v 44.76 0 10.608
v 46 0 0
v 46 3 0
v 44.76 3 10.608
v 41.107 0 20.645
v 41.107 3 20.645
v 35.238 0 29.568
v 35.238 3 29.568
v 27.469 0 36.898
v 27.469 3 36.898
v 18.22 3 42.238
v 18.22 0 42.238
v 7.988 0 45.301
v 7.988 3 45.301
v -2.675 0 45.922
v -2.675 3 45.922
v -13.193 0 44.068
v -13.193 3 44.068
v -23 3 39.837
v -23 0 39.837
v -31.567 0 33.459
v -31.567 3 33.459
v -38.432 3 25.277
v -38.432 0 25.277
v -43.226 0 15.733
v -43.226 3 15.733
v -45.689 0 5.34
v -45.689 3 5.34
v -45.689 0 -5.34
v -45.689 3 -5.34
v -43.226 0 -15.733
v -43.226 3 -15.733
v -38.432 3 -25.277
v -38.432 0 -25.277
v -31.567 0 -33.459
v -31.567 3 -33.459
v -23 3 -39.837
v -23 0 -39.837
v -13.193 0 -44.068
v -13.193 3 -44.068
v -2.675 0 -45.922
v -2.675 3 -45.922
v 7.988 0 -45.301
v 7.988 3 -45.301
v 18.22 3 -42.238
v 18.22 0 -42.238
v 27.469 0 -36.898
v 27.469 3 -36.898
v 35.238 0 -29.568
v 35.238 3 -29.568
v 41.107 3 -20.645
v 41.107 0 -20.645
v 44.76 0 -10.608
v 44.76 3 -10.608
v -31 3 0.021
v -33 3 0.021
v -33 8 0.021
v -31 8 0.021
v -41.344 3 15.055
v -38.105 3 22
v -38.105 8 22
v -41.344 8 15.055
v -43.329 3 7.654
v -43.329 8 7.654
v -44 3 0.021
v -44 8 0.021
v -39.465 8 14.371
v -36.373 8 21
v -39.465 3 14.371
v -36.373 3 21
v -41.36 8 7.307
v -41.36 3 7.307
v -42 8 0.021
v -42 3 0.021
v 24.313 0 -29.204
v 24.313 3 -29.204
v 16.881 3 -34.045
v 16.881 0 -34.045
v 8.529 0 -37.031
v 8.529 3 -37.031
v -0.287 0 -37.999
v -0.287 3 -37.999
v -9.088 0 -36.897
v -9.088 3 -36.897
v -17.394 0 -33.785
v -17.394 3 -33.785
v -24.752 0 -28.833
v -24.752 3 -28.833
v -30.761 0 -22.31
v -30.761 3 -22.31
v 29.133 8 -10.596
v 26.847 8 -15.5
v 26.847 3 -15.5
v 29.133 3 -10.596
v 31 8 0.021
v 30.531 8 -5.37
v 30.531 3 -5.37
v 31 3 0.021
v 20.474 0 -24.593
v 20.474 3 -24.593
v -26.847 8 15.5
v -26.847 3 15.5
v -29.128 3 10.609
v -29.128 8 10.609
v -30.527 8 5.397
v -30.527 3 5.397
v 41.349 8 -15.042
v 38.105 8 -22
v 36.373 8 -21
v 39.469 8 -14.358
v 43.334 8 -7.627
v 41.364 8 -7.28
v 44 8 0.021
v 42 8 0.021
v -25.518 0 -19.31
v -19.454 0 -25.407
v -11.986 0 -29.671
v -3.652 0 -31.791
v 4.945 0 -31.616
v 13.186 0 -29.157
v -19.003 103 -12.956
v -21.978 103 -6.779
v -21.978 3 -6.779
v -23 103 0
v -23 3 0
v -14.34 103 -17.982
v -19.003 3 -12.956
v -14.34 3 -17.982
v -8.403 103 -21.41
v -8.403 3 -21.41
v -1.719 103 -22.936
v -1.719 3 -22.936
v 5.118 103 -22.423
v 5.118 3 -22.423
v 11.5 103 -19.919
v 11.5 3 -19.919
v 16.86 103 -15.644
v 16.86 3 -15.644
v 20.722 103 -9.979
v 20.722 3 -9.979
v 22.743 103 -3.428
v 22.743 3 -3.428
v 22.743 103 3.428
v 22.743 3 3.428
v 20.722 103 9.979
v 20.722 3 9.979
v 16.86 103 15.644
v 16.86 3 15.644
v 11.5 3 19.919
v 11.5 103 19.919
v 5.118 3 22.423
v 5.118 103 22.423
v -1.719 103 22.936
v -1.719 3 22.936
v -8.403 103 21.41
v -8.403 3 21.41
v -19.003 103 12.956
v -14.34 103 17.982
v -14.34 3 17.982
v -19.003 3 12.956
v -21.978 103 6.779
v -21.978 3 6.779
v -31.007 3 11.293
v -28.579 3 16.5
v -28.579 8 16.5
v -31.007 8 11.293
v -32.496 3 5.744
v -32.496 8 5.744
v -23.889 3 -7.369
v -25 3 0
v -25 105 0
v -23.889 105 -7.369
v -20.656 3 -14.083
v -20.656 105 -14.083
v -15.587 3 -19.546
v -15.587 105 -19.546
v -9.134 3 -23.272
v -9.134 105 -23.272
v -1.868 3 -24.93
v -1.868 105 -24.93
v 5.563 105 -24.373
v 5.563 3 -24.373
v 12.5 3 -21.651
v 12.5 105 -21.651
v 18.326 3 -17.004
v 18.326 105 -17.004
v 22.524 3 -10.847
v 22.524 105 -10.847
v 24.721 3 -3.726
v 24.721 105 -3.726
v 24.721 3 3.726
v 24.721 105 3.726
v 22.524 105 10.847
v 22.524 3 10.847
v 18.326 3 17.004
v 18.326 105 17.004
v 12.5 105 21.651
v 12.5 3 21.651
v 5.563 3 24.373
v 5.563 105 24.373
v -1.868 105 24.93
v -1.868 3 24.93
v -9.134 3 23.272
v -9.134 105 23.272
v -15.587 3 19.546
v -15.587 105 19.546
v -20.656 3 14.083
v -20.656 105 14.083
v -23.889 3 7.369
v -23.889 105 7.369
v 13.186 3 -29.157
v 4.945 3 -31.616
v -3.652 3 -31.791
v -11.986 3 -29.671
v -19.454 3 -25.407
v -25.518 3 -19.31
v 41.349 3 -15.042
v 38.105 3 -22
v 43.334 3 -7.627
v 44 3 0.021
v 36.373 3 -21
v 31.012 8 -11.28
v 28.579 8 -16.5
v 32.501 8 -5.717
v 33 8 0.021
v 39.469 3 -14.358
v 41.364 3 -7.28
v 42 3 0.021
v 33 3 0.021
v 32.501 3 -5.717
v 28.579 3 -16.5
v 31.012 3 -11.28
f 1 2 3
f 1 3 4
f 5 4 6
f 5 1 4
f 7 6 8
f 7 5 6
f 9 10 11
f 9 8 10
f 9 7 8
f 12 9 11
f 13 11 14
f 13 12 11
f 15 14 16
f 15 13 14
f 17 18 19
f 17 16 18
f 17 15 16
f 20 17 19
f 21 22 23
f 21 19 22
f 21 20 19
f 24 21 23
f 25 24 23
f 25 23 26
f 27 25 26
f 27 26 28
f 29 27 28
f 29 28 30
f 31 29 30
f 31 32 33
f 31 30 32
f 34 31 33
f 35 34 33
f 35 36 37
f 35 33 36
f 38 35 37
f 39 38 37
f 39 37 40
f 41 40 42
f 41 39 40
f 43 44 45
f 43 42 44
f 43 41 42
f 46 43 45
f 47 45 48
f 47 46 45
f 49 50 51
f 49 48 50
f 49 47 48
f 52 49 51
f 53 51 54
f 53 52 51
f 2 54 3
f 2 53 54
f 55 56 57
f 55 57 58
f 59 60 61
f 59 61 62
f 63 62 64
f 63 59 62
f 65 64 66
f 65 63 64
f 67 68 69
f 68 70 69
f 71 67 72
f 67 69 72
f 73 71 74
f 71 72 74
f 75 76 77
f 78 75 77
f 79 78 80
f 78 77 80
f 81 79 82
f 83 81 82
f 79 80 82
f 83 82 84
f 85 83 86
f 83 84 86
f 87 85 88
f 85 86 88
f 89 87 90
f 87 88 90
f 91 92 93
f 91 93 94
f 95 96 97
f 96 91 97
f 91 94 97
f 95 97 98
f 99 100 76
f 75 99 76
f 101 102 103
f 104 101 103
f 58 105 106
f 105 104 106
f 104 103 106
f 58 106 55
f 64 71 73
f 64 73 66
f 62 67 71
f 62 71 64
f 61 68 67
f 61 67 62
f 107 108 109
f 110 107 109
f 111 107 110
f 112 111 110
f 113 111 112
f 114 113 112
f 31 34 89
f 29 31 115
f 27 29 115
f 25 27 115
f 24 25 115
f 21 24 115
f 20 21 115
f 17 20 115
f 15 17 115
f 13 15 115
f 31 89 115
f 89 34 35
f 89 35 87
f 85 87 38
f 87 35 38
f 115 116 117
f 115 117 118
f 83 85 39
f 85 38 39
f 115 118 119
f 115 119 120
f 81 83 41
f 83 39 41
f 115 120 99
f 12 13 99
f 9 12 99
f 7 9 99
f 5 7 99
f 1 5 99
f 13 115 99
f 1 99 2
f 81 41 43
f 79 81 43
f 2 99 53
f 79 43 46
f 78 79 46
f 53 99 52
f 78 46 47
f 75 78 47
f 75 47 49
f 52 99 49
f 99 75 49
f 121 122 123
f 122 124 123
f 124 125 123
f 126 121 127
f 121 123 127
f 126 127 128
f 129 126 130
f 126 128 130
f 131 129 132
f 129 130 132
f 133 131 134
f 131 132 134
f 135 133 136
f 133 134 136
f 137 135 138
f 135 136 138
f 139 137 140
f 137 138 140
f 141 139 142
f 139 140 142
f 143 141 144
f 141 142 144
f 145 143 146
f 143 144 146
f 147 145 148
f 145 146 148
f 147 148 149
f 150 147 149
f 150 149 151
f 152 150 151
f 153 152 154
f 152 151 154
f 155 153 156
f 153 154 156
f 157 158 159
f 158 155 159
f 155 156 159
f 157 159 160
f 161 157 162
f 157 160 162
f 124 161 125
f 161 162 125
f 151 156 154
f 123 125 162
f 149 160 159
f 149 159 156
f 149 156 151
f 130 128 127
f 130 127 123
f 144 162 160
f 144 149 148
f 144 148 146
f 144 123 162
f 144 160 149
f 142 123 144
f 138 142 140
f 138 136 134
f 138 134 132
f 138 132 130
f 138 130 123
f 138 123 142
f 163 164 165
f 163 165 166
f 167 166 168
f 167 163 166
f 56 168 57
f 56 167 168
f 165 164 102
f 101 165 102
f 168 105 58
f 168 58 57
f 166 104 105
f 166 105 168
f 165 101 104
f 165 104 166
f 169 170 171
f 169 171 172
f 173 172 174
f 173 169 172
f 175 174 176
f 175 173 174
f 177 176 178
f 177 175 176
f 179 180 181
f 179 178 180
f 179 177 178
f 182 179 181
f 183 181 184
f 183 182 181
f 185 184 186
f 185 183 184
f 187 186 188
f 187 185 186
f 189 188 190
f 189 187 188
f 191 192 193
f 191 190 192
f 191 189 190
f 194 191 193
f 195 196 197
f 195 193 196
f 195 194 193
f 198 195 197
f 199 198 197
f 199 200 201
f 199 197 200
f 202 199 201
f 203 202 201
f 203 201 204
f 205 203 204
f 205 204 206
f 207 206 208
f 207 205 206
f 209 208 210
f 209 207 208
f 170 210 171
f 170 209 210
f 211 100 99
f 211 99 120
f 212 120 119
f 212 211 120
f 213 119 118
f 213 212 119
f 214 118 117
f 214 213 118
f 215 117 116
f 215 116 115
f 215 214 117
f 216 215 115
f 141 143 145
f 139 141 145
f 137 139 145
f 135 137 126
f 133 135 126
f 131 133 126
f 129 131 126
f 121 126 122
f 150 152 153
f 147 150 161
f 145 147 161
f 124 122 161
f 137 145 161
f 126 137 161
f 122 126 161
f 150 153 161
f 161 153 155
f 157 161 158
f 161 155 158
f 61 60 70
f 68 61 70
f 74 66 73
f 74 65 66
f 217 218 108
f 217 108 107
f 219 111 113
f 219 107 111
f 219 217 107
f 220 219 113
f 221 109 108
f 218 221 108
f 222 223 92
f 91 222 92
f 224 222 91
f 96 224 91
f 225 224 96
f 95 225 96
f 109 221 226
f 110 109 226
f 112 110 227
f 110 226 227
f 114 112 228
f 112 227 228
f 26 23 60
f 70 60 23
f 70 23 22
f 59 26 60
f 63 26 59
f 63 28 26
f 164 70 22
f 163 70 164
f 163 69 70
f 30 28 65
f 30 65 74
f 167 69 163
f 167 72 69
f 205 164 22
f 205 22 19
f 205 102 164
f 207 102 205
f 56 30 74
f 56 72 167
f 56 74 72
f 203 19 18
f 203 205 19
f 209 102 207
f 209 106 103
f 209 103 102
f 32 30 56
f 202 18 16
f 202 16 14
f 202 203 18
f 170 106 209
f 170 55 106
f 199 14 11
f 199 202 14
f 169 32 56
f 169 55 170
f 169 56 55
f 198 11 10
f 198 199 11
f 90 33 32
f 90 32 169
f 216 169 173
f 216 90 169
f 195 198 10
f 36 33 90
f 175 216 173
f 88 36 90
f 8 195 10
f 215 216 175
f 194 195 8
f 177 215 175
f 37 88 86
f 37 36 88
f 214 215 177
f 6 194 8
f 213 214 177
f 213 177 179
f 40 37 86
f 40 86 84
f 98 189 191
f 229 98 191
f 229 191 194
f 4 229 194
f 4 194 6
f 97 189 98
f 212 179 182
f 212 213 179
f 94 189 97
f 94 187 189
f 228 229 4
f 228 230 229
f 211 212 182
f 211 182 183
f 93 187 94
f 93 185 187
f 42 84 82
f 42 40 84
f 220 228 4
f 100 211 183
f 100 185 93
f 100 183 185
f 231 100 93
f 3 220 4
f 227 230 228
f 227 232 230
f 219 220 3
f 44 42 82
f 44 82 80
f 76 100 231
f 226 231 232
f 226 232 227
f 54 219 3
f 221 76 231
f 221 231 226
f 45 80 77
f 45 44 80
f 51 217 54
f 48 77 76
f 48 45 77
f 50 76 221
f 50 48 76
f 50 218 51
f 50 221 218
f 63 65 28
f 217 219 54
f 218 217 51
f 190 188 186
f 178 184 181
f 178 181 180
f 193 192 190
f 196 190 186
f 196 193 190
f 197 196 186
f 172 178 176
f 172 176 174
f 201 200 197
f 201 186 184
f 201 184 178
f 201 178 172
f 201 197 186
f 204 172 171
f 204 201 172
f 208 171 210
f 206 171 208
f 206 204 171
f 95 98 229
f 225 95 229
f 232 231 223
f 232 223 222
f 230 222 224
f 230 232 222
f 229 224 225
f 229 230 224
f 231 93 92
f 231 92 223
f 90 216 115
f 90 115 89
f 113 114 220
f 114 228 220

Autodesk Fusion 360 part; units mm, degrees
sketch "Sketch1" plane through (0, 0, 0) normal (0, 1, 0) x (1, 0, 0)
  circle A0 centre (0, 0) radius 46
  dimension "d1" = 92
extrude "Extrude1" add sketch "Sketch1" along normal blind 3
sketch "Sketch2" plane through (0, 3, 0) normal (0, 1, 0) x (-1, 0, 0)
  circle A0 centre (0, 0) radius 46
  arc A1 (44, 0.0207) -> (38.1051, 22) centre (0, 0) ccw
  arc A2 (-44, 0.0207) -> (-38.1051, -22) centre (0, 0) ccw
  arc A3 (42, 0.0207) -> (36.3731, 21) centre (0, 0) ccw
  arc A4 (-42, 0.0207) -> (-36.3731, -21) centre (0, 0) ccw
  arc A5 (33, 0.0207) -> (28.5788, 16.5) centre (0, 0) ccw
  arc A6 (-33, 0.0207) -> (-28.5788, -16.5) centre (0, 0) ccw
  arc A7 (31, 0.0207) -> (26.8468, 15.5) centre (0, 0) ccw
  arc A8 (-31, 0.0207) -> (-26.8468, -15.5) centre (0, 0) ccw
  line L0 (-26.8468, -15.5) -> (-28.5788, -16.5)
  line L1 (-36.3731, -21) -> (-38.1051, -22)
  line L2 (-31, 0.0207) -> (-33, 0.0207)
  line L3 (-42, 0.0207) -> (-44, 0.0207)
  line L4 (0.0359, 0.0207) -> (0, 0)
  line L5 (44, 0.0207) -> (42, 0.0207)
  line L6 (33, 0.0207) -> (31, 0.0207)
  line L7 (38.1051, 22) -> (36.3731, 21)
  line L8 (28.5788, 16.5) -> (26.8468, 15.5)
  dimension "d8" = 30
  dimension "d9" = 30
  dimension "d23" = 42
  dimension "d24" = 44
  dimension "d25" = 42
  dimension "d26" = 33
  dimension "d27" = 31
  dimension "d28" = 31
  dimension "d29" = 33
extrude "Extrude2" add sketch "Sketch2" along normal blind 5 contours A1 A3 L5 L7 | A2 A4 L1 L3 | A5 A7 L6 L8 | A6 A8 L0 L2
sketch "Sketch3" plane through (0, 3, 0) normal (0, 1, 0) x (-1, 0, 0)
  line L0 (44, 0.0207) -> (42, 0.0207)
  arc A0 (42, 0.0207) -> (36.3731, 21) centre (0, 0) ccw
  line L1 (36.3731, 21) -> (38.1051, 22)
  arc A1 (44, 0.0207) -> (38.1051, 22) centre (0, 0) ccw
  line L2 (-36.3731, -21) -> (-38.1051, -22)
  arc A2 (-44, 0.0207) -> (-38.1051, -22) centre (0, 0) ccw
  line L3 (-44, 0.0207) -> (-42, 0.0207)
  arc A3 (-42, 0.0207) -> (-36.3731, -21) centre (0, 0) ccw
  line L4 (33, 0.0207) -> (31, 0.0207)
  arc A4 (31, 0.0207) -> (26.8468, 15.5) centre (0, 0) ccw
  line L5 (26.8468, 15.5) -> (28.5788, 16.5)
  arc A5 (33, 0.0207) -> (28.5788, 16.5) centre (0, 0) ccw
  line L6 (-26.8468, -15.5) -> (-28.5788, -16.5)
  arc A6 (-33, 0.0207) -> (-28.5788, -16.5) centre (0, 0) ccw
  line L7 (-33, 0.0207) -> (-31, 0.0207)
  arc A7 (-31, 0.0207) -> (-26.8468, -15.5) centre (0, 0) ccw
  circle A8 centre (0, 0) radius 46
  line L8 (-20.4739, -24.5931) -> (-24.3128, -29.2043)
  line L9 (25.5175, -19.3096) -> (30.7614, -22.31)
  arc A9 (-24.3128, -29.2043) -> (30.7614, -22.31) centre (0, 0) ccw
  arc A10 (-20.4739, -24.5931) -> (25.5175, -19.3096) centre (0, 0) ccw
  arc A11 (28, 0.0207) -> (24.2487, 14) centre (0, 0) ccw
  arc A12 (-28, 0.0207) -> (-24.2487, -14) centre (0, 0) ccw
  dimension "d14" = 100
  dimension "d21" = 32
  dimension "d22" = 38
extrude "Extrude3" cut sketch "Sketch3" against normal blind 3 contours L8 L9 A9 A10
sketch "Sketch4" plane through (0, 3, 0) normal (0, 1, 0) x (-1, 0, 0)
  line L0 (25.5175, -19.3096) -> (30.7614, -22.31)
  arc A0 (-24.3128, -29.2043) -> (30.7614, -22.31) centre (0, 0) ccw
  line L1 (-24.3128, -29.2043) -> (-20.4739, -24.5931)
  arc A1 (-20.4739, -24.5931) -> (25.5175, -19.3096) centre (0, 0) ccw
  line L2 (44, 0.0207) -> (42, 0.0207)
  arc A2 (42, 0.0207) -> (36.3731, 21) centre (0, 0) ccw
  line L3 (36.3731, 21) -> (38.1051, 22)
  arc A3 (44, 0.0207) -> (38.1051, 22) centre (0, 0) ccw
  line L4 (-36.3731, -21) -> (-38.1051, -22)
  arc A4 (-44, 0.0207) -> (-38.1051, -22) centre (0, 0) ccw
  line L5 (-44, 0.0207) -> (-42, 0.0207)
  arc A5 (-42, 0.0207) -> (-36.3731, -21) centre (0, 0) ccw
  line L6 (33, 0.0207) -> (31, 0.0207)
  arc A6 (31, 0.0207) -> (26.8468, 15.5) centre (0, 0) ccw
  line L7 (26.8468, 15.5) -> (28.5788, 16.5)
  arc A7 (33, 0.0207) -> (28.5788, 16.5) centre (0, 0) ccw
  line L8 (-26.8468, -15.5) -> (-28.5788, -16.5)
  arc A8 (-33, 0.0207) -> (-28.5788, -16.5) centre (0, 0) ccw
  line L9 (-33, 0.0207) -> (-31, 0.0207)
  arc A9 (-31, 0.0207) -> (-26.8468, -15.5) centre (0, 0) ccw
  circle A10 centre (0, 0) radius 46
  circle A11 centre (0, 0) radius 25
  circle A12 centre (0, 0) radius 23
  dimension "d17" = 50
  dimension "d18" = 46
extrude "Extrude4" add sketch "Sketch4" along normal blind 102 contours A11
sketch "Sketch5" plane through (0, 105, 0) normal (0, 1, 0) x (-1, 0, 0)
  circle A0 centre (0, 0) radius 23
  circle A1 centre (0, 0) radius 25
  circle A2 centre (0, 0) radius 23
extrude "Extrude5" add sketch "Sketch5" against normal blind 2 contours A0 A2
